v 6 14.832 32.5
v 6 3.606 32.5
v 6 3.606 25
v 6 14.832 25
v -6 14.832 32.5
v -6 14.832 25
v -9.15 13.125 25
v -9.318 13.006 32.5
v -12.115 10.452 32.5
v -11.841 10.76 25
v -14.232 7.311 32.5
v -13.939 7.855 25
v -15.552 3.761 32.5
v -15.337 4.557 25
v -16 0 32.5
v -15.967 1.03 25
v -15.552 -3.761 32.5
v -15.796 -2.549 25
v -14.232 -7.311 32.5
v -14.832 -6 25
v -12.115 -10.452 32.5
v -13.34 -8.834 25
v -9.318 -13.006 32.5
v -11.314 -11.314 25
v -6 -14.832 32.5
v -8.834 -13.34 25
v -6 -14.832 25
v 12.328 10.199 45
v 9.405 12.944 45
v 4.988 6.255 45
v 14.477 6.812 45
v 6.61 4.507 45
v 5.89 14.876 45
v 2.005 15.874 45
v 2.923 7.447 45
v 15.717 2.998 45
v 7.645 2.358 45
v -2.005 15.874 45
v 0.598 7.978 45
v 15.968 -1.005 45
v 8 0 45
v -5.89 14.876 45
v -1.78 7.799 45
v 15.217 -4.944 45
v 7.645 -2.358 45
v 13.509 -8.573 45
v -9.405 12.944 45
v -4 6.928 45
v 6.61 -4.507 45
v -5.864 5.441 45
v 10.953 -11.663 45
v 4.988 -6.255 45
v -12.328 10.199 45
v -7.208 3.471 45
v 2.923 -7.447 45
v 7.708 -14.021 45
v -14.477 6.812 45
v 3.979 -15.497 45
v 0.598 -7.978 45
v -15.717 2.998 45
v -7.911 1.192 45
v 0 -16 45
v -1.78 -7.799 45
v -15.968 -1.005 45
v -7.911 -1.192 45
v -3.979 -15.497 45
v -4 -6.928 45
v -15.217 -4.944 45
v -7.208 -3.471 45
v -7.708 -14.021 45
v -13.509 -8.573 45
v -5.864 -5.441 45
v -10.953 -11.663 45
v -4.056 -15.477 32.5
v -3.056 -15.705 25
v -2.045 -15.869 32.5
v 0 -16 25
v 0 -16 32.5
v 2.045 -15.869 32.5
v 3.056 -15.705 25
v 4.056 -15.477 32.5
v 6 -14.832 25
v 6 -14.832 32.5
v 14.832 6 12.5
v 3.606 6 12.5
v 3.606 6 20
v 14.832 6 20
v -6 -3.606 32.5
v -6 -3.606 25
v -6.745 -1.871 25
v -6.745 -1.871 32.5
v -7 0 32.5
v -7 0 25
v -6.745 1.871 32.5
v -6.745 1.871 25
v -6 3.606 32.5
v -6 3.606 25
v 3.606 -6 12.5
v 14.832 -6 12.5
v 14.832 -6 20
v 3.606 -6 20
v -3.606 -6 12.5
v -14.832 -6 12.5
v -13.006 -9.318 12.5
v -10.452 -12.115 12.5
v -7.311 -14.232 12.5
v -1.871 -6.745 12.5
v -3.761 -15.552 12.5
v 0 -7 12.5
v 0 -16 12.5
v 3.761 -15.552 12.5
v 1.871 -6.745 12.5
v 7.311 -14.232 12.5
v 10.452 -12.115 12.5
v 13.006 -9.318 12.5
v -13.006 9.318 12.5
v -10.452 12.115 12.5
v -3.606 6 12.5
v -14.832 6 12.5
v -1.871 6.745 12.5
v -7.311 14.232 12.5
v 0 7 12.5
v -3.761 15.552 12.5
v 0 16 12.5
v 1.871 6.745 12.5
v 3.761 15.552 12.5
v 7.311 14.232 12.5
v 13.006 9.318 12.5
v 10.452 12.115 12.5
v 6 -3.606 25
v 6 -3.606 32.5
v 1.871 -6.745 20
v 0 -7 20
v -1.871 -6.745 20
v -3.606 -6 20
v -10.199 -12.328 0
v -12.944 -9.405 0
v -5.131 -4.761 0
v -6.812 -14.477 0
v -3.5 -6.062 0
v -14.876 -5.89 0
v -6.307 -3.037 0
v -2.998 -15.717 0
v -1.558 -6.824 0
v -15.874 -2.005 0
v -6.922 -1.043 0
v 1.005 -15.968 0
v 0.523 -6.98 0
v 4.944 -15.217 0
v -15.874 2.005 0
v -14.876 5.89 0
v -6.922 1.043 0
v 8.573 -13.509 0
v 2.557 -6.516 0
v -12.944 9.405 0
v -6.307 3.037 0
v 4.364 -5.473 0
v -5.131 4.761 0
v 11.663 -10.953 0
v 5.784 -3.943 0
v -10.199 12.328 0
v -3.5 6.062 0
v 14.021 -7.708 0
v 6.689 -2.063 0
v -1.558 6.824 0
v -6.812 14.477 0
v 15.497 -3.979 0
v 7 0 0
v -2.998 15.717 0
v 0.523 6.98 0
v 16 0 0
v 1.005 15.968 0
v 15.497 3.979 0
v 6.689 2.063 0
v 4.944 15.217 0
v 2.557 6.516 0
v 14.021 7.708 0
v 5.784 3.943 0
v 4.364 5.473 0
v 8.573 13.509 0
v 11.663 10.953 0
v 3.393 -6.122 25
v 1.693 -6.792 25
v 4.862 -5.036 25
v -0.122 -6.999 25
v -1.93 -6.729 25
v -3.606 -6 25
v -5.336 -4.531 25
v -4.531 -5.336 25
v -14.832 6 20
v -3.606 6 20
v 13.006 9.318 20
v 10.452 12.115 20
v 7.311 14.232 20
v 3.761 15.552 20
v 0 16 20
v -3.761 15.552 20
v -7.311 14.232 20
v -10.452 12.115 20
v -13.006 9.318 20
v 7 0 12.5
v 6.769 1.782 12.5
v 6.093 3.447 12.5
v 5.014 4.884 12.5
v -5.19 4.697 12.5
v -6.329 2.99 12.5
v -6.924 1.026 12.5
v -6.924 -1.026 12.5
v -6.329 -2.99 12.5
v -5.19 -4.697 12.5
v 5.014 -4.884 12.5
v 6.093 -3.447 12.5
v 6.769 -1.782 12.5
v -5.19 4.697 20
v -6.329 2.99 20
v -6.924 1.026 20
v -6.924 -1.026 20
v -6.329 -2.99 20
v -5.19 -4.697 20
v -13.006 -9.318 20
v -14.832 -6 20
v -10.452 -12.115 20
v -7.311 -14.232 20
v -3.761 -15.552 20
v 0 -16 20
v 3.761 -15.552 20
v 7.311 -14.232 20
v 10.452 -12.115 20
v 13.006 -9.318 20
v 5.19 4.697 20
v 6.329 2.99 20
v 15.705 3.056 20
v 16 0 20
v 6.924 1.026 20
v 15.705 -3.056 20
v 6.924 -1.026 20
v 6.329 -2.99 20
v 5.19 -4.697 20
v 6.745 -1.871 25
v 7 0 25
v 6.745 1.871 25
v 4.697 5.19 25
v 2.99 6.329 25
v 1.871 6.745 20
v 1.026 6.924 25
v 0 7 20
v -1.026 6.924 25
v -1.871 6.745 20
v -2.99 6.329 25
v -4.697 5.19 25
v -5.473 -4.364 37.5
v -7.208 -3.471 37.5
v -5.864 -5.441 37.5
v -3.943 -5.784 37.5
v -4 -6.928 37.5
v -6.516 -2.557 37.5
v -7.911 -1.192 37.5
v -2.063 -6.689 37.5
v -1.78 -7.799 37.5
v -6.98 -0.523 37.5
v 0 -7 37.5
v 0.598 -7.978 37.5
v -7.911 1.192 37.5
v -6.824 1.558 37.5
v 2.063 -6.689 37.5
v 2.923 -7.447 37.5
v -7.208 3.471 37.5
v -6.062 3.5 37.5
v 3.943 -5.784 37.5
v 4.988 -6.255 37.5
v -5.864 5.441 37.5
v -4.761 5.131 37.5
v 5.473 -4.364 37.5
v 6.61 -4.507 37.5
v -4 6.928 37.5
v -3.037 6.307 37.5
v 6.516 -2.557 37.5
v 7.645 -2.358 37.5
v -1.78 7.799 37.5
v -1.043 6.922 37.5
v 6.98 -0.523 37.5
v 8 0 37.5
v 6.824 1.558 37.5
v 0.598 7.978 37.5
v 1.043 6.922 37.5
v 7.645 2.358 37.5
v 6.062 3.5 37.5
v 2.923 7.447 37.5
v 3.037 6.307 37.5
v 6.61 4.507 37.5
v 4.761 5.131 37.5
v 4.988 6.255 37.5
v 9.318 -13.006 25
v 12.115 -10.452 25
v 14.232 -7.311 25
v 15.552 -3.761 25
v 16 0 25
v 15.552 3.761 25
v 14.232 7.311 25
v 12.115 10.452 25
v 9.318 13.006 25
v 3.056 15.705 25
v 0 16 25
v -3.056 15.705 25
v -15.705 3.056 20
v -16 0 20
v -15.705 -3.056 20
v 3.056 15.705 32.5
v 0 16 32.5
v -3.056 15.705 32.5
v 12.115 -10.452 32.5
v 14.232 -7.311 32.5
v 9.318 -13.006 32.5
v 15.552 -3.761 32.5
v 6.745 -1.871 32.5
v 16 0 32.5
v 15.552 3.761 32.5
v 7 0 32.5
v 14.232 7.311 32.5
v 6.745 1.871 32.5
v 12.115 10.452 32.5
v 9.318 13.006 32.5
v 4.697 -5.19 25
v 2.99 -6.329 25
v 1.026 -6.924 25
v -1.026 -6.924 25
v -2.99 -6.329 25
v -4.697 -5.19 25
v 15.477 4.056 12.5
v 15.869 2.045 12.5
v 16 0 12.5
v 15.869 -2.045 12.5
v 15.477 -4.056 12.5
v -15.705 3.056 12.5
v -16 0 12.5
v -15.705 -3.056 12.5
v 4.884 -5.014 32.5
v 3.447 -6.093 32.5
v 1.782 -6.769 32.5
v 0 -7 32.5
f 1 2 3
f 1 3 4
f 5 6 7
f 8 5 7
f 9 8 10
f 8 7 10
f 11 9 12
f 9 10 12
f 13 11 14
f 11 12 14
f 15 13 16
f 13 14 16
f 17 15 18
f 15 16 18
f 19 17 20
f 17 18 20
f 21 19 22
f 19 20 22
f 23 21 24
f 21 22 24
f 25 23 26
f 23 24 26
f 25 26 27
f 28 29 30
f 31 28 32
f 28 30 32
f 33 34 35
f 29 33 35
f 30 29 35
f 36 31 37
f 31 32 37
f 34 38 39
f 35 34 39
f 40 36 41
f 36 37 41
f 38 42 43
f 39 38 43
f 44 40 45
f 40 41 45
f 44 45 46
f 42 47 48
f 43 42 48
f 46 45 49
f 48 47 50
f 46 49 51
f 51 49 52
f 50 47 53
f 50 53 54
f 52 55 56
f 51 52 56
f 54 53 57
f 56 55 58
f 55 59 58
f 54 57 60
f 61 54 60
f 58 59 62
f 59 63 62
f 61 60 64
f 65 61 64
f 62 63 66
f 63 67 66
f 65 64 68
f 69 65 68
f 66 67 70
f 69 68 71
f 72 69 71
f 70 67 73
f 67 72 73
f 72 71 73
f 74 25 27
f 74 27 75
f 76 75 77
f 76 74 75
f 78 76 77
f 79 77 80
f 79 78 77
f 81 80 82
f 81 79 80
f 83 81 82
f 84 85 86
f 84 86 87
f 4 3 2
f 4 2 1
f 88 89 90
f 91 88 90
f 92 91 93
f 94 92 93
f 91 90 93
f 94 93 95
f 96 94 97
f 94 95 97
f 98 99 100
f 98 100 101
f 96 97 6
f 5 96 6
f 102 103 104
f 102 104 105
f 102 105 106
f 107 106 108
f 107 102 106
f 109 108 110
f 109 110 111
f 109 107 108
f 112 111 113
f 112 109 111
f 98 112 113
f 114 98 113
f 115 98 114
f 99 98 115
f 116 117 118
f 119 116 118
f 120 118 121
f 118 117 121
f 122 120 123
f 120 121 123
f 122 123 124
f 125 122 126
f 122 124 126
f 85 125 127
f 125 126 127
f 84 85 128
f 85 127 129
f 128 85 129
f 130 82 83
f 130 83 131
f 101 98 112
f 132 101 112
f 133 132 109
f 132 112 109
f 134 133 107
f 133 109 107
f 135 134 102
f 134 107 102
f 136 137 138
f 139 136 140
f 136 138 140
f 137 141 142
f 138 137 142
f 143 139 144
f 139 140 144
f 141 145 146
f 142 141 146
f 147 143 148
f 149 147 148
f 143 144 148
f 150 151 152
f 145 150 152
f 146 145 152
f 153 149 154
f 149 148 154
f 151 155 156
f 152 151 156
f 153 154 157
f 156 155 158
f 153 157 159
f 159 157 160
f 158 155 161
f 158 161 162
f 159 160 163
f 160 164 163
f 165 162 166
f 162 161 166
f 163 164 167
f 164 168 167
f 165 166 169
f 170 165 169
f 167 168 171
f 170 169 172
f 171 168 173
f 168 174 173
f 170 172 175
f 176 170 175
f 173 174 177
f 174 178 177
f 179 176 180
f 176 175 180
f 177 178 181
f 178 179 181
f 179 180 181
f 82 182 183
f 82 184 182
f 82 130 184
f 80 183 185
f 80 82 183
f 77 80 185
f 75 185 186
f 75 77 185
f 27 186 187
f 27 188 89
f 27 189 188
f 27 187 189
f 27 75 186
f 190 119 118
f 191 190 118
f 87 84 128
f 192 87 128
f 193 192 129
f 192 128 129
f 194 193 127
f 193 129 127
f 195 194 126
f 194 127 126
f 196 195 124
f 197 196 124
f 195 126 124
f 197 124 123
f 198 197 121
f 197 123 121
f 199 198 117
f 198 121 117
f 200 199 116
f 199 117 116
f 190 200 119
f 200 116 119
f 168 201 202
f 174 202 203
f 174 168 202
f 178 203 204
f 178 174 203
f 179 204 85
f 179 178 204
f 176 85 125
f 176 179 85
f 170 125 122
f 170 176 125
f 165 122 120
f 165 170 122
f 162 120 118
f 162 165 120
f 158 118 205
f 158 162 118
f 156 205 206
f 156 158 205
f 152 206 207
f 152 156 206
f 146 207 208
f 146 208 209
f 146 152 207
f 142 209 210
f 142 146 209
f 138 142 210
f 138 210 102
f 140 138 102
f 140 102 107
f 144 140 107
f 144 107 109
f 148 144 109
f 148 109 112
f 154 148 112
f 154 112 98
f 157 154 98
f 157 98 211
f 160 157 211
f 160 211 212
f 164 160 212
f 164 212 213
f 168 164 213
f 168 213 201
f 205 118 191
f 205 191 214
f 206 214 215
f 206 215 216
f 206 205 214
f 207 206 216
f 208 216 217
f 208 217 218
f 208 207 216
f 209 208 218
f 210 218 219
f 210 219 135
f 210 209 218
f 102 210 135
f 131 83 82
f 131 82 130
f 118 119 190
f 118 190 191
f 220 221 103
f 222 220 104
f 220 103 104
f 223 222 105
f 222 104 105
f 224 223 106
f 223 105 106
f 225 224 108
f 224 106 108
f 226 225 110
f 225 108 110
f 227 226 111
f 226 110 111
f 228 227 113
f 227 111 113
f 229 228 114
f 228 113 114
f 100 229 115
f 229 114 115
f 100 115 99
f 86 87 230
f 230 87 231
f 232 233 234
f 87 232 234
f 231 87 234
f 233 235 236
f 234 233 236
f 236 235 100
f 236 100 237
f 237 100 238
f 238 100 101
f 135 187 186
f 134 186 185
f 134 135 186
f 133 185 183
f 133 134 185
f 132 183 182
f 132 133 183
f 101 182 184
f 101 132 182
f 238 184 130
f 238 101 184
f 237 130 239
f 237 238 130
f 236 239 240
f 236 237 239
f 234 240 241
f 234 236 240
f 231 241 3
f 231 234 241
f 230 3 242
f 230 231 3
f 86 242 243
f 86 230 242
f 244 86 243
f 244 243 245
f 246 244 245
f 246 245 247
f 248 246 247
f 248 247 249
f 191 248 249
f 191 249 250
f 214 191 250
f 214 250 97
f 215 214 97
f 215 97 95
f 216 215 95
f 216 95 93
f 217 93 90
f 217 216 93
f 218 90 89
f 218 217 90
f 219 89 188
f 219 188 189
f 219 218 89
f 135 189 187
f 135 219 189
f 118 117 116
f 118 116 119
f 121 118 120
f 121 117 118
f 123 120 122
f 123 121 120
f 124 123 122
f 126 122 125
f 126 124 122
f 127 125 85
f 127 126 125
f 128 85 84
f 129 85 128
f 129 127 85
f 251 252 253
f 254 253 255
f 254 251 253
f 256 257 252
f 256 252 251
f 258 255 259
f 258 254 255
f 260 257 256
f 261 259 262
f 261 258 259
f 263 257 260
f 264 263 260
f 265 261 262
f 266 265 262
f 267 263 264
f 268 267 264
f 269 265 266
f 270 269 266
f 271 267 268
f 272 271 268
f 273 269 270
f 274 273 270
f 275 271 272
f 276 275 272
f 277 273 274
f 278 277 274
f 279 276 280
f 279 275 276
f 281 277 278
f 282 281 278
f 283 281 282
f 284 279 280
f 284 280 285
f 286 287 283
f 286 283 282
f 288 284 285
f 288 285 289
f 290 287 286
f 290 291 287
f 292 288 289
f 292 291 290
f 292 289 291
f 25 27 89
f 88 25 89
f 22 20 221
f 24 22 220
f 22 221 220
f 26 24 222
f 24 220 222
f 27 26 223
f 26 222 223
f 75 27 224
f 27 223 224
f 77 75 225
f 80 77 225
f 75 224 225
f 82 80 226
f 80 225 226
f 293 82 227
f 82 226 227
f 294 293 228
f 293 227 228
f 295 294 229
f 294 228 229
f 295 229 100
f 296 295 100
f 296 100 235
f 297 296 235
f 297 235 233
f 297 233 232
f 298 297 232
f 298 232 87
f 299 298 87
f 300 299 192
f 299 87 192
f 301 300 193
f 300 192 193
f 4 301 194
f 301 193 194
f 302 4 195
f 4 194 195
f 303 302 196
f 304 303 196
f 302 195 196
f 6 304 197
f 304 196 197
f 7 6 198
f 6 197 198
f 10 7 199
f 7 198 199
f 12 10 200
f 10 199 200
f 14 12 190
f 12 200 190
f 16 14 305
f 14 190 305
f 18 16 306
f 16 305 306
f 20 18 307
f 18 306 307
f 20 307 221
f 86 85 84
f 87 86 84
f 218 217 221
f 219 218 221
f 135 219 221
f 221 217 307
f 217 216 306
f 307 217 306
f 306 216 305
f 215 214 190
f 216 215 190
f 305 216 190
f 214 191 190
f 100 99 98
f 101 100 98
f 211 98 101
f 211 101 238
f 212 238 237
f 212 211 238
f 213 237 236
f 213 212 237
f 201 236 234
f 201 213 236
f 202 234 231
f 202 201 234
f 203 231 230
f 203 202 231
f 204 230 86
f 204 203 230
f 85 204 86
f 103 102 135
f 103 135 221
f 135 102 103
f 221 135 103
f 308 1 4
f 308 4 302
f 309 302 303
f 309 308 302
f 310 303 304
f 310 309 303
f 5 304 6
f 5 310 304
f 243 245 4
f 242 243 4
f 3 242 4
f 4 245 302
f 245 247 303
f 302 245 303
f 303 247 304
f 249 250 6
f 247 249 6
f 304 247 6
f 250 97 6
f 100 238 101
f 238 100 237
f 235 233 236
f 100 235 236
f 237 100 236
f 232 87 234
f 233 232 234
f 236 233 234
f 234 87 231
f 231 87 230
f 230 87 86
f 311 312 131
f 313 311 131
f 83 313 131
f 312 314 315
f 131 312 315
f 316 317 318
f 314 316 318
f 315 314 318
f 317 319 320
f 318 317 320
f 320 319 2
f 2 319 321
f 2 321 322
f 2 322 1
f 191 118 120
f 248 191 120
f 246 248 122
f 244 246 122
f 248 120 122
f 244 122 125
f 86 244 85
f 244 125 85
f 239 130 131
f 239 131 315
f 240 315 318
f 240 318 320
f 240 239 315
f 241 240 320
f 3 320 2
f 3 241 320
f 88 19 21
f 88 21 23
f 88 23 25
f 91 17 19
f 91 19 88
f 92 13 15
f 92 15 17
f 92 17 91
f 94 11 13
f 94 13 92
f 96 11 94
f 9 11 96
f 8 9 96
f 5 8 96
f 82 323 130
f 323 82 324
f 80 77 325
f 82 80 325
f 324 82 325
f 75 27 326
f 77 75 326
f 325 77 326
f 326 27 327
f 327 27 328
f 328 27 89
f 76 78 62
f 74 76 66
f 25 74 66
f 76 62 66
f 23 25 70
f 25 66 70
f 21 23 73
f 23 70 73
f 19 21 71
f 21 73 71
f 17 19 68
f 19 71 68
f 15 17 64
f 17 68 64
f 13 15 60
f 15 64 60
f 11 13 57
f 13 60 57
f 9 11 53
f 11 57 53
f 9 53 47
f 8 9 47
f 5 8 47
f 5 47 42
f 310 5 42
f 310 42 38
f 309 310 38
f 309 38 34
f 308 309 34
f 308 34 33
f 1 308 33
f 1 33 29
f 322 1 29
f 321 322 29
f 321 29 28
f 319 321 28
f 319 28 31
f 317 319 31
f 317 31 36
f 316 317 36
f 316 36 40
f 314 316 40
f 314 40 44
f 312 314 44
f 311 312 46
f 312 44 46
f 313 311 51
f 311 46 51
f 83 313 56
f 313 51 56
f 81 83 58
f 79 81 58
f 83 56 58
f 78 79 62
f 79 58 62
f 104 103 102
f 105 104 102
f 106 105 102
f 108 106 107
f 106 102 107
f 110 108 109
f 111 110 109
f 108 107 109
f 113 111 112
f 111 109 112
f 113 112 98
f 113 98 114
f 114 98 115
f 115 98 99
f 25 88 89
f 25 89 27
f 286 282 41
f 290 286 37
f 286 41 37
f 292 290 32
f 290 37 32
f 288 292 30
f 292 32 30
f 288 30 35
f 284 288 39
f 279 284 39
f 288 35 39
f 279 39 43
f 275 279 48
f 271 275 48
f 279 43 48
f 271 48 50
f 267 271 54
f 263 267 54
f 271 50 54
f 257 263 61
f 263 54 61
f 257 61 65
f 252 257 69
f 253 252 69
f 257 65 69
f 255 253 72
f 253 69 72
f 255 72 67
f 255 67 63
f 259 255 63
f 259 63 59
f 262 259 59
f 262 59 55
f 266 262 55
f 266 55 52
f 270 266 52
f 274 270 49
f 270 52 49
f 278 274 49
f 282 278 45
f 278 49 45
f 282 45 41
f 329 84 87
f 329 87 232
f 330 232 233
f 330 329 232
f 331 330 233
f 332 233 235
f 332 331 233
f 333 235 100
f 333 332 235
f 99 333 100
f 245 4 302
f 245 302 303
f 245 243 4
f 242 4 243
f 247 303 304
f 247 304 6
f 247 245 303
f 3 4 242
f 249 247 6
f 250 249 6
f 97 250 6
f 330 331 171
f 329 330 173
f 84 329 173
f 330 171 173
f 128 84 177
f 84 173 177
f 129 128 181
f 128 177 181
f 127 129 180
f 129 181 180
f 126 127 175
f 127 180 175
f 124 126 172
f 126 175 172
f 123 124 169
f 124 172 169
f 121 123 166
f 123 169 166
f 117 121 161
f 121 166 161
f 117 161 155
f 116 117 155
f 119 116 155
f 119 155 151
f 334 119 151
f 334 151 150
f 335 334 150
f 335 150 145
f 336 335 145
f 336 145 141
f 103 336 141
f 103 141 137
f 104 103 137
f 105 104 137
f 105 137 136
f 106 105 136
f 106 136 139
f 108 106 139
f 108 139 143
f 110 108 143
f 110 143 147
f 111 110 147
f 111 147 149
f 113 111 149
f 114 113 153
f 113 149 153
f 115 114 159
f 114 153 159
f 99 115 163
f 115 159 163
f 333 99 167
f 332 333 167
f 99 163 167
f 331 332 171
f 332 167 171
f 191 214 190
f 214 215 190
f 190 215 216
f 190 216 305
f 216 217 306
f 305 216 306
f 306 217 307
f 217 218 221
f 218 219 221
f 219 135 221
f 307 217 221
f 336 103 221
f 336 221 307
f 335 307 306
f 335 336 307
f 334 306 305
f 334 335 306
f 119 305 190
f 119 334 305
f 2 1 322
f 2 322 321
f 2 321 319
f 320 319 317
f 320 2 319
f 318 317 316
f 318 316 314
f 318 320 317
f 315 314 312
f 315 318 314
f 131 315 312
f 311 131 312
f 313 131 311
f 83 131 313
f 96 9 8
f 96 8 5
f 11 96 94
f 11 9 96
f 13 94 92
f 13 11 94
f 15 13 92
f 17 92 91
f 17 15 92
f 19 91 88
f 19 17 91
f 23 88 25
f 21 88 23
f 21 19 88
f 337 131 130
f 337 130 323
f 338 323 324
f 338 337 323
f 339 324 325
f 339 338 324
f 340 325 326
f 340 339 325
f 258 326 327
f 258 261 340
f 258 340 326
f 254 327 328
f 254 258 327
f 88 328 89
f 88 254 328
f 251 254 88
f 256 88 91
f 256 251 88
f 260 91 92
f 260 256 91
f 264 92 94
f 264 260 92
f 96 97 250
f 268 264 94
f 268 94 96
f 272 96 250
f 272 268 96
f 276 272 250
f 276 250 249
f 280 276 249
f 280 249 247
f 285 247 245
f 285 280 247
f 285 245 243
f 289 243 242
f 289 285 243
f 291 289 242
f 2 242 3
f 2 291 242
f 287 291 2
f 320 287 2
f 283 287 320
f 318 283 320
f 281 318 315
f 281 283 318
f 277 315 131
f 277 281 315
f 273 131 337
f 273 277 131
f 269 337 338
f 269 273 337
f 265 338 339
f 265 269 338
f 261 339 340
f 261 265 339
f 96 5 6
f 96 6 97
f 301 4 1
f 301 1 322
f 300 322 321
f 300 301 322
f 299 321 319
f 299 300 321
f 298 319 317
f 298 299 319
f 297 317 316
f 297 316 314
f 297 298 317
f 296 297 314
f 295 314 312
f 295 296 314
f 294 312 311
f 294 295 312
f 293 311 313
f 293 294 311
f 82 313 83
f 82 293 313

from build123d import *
from build123d.topology import SkipClean

# Parameters (mm, degrees)
CROQUIS2_R                 = 16
CROQUIS2_R_2               = 7
SALIENTE_EXTRUIR1_DEPTH    = 12.5
SALIENTE_EXTRUIR2_DEPTH    = 7.5
SALIENTE_EXTRUIR3_DEPTH    = 7.5
SALIENTE_EXTRUIR3_2_DEPTH  = 7.5
CROQUIS5_R                 = 16
CROQUIS5_R_2               = 7
SALIENTE_EXTRUIR5_DEPTH    = 5
SALIENTE_EXTRUIR7_DEPTH    = 7.5
S_LIDO_MOVER_COPIAR8_ANGLE = 180
S_LIDO_MOVER_COPIAR9_ANGLE = 90
CROQUIS7_R                 = 8
CORTAR_EXTRUIR1_DEPTH      = 7.5


with BuildPart() as part:
    # Croquis2 → Saliente-Extruir1 (new body)
    with BuildSketch(Plane.XY):
        Circle(CROQUIS2_R)
        Circle(CROQUIS2_R_2, mode=Mode.SUBTRACT)
    extrude(amount=SALIENTE_EXTRUIR1_DEPTH)

    # Croquis3 → Saliente-Extruir2 (add)
    with SkipClean():  # the faces are left unmerged after this step: merging them gives an invalid solid
        with BuildSketch(Plane.XY.offset(12.5)):
            with BuildLine():
                Line((-14.832396974, 6), (-3.605551275, 6))
                ThreePointArc((-3.605551275, 6), (-7, 0), (-3.605551275, -6))
                Line((-3.605551275, -6), (-14.832396974, -6))
                ThreePointArc((-14.832396974, -6), (-16, 0), (-14.832396974, 6))
            make_face()
            with BuildLine():
                Line((3.605551275, 6), (14.832396974, 6))
                ThreePointArc((14.832396974, 6), (16, 0), (14.832396974, -6))
                Line((14.832396974, -6), (3.605551275, -6))
                ThreePointArc((3.605551275, -6), (7, 0), (3.605551275, 6))
            make_face()
        extrude(amount=SALIENTE_EXTRUIR2_DEPTH)


with BuildPart() as body_2:
    # Croquis4 → Saliente-Extruir3 (new body)
    with BuildSketch(Plane.XY.offset(12.5)):
        with BuildLine():
            Line((-14.832396974, 6), (-3.605551275, 6))
            ThreePointArc((-3.605551275, 6), (0, 7), (3.605551275, 6))
            Line((3.605551275, 6), (14.832396974, 6))
            ThreePointArc((14.832396974, 6), (0, 16), (-14.832396974, 6))
        make_face()
    extrude(amount=SALIENTE_EXTRUIR3_DEPTH)


with BuildPart() as body_3:
    # Croquis4 → Saliente-Extruir3 2 (new body)
    with BuildSketch(Plane.XY.offset(12.5)):
        with BuildLine():
            Line((14.832396974, -6), (3.605551275, -6))
            ThreePointArc((3.605551275, -6), (0, -7), (-3.605551275, -6))
            Line((-3.605551275, -6), (-14.832396974, -6))
            ThreePointArc((-14.832396974, -6), (0, -16), (14.832396974, -6))
        make_face()
    extrude(amount=SALIENTE_EXTRUIR3_2_DEPTH)


with BuildPart() as body_4:
    # Croquis5 → Saliente-Extruir5 (new body)
    with BuildSketch(Plane.XY.offset(20)):
        Circle(CROQUIS5_R)
        Circle(CROQUIS5_R_2, mode=Mode.SUBTRACT)
    extrude(amount=SALIENTE_EXTRUIR5_DEPTH)


with BuildPart() as body_2_1:
    add(body_2.part)

    # Combinar1: union body 4, body 3
    add(body_4.part)
    add(body_3.part)

    # Croquis6 → Saliente-Extruir7 (add)
    with SkipClean():  # the faces are left unmerged after this step: merging them gives an invalid solid
        with BuildSketch(Plane.XY.offset(25)):
            with BuildLine():
                Line((-6, -14.832396974), (-6, -3.605551275))
                ThreePointArc((-6, -3.605551275), (-7, 0), (-6, 3.605551275))
                Line((-6, 3.605551275), (-6, 14.832396974))
                ThreePointArc((-6, 14.832396974), (-16, 0), (-6, -14.832396974))
            make_face()
            with BuildLine():
                Line((6, -14.832396974), (6, -3.605551275))
                ThreePointArc((6, -3.605551275), (7, 0), (6, 3.605551275))
                Line((6, 3.605551275), (6, 14.832396974))
                ThreePointArc((6, 14.832396974), (16, 0), (6, -14.832396974))
            make_face()
        extrude(amount=SALIENTE_EXTRUIR7_DEPTH)


with BuildPart() as body_3_2:
    # Sólido-Mover/Copiar6: copy of part
    add(part.part.moved(Location((0, 0, 32.5))))


with BuildPart() as body_3_2_1:
    # Sólido-Mover/Copiar8: moved
    add(body_3_2.part.rotate(Axis((0, 0, 42.5), (0, 1, 0)), S_LIDO_MOVER_COPIAR8_ANGLE))


with BuildPart() as body_3_2_2:
    # Sólido-Mover/Copiar9: moved
    add(body_3_2_1.part.rotate(Axis((0, 0, 0), (0, 0, 1)), S_LIDO_MOVER_COPIAR9_ANGLE))


with BuildPart() as body_3_2_3:
    # Sólido-Mover/Copiar10: moved
    add(body_3_2_2.part.moved(Location((0, 0, -7.5))))

    # Croquis7 → Cortar-Extruir1 (cut)
    with BuildSketch(Plane.XY.offset(45)):
        Circle(CROQUIS7_R)
    extrude(amount=-CORTAR_EXTRUIR1_DEPTH, mode=Mode.SUBTRACT)


solid = Compound([part.part, body_2_1.part, body_3_2_3.part])
